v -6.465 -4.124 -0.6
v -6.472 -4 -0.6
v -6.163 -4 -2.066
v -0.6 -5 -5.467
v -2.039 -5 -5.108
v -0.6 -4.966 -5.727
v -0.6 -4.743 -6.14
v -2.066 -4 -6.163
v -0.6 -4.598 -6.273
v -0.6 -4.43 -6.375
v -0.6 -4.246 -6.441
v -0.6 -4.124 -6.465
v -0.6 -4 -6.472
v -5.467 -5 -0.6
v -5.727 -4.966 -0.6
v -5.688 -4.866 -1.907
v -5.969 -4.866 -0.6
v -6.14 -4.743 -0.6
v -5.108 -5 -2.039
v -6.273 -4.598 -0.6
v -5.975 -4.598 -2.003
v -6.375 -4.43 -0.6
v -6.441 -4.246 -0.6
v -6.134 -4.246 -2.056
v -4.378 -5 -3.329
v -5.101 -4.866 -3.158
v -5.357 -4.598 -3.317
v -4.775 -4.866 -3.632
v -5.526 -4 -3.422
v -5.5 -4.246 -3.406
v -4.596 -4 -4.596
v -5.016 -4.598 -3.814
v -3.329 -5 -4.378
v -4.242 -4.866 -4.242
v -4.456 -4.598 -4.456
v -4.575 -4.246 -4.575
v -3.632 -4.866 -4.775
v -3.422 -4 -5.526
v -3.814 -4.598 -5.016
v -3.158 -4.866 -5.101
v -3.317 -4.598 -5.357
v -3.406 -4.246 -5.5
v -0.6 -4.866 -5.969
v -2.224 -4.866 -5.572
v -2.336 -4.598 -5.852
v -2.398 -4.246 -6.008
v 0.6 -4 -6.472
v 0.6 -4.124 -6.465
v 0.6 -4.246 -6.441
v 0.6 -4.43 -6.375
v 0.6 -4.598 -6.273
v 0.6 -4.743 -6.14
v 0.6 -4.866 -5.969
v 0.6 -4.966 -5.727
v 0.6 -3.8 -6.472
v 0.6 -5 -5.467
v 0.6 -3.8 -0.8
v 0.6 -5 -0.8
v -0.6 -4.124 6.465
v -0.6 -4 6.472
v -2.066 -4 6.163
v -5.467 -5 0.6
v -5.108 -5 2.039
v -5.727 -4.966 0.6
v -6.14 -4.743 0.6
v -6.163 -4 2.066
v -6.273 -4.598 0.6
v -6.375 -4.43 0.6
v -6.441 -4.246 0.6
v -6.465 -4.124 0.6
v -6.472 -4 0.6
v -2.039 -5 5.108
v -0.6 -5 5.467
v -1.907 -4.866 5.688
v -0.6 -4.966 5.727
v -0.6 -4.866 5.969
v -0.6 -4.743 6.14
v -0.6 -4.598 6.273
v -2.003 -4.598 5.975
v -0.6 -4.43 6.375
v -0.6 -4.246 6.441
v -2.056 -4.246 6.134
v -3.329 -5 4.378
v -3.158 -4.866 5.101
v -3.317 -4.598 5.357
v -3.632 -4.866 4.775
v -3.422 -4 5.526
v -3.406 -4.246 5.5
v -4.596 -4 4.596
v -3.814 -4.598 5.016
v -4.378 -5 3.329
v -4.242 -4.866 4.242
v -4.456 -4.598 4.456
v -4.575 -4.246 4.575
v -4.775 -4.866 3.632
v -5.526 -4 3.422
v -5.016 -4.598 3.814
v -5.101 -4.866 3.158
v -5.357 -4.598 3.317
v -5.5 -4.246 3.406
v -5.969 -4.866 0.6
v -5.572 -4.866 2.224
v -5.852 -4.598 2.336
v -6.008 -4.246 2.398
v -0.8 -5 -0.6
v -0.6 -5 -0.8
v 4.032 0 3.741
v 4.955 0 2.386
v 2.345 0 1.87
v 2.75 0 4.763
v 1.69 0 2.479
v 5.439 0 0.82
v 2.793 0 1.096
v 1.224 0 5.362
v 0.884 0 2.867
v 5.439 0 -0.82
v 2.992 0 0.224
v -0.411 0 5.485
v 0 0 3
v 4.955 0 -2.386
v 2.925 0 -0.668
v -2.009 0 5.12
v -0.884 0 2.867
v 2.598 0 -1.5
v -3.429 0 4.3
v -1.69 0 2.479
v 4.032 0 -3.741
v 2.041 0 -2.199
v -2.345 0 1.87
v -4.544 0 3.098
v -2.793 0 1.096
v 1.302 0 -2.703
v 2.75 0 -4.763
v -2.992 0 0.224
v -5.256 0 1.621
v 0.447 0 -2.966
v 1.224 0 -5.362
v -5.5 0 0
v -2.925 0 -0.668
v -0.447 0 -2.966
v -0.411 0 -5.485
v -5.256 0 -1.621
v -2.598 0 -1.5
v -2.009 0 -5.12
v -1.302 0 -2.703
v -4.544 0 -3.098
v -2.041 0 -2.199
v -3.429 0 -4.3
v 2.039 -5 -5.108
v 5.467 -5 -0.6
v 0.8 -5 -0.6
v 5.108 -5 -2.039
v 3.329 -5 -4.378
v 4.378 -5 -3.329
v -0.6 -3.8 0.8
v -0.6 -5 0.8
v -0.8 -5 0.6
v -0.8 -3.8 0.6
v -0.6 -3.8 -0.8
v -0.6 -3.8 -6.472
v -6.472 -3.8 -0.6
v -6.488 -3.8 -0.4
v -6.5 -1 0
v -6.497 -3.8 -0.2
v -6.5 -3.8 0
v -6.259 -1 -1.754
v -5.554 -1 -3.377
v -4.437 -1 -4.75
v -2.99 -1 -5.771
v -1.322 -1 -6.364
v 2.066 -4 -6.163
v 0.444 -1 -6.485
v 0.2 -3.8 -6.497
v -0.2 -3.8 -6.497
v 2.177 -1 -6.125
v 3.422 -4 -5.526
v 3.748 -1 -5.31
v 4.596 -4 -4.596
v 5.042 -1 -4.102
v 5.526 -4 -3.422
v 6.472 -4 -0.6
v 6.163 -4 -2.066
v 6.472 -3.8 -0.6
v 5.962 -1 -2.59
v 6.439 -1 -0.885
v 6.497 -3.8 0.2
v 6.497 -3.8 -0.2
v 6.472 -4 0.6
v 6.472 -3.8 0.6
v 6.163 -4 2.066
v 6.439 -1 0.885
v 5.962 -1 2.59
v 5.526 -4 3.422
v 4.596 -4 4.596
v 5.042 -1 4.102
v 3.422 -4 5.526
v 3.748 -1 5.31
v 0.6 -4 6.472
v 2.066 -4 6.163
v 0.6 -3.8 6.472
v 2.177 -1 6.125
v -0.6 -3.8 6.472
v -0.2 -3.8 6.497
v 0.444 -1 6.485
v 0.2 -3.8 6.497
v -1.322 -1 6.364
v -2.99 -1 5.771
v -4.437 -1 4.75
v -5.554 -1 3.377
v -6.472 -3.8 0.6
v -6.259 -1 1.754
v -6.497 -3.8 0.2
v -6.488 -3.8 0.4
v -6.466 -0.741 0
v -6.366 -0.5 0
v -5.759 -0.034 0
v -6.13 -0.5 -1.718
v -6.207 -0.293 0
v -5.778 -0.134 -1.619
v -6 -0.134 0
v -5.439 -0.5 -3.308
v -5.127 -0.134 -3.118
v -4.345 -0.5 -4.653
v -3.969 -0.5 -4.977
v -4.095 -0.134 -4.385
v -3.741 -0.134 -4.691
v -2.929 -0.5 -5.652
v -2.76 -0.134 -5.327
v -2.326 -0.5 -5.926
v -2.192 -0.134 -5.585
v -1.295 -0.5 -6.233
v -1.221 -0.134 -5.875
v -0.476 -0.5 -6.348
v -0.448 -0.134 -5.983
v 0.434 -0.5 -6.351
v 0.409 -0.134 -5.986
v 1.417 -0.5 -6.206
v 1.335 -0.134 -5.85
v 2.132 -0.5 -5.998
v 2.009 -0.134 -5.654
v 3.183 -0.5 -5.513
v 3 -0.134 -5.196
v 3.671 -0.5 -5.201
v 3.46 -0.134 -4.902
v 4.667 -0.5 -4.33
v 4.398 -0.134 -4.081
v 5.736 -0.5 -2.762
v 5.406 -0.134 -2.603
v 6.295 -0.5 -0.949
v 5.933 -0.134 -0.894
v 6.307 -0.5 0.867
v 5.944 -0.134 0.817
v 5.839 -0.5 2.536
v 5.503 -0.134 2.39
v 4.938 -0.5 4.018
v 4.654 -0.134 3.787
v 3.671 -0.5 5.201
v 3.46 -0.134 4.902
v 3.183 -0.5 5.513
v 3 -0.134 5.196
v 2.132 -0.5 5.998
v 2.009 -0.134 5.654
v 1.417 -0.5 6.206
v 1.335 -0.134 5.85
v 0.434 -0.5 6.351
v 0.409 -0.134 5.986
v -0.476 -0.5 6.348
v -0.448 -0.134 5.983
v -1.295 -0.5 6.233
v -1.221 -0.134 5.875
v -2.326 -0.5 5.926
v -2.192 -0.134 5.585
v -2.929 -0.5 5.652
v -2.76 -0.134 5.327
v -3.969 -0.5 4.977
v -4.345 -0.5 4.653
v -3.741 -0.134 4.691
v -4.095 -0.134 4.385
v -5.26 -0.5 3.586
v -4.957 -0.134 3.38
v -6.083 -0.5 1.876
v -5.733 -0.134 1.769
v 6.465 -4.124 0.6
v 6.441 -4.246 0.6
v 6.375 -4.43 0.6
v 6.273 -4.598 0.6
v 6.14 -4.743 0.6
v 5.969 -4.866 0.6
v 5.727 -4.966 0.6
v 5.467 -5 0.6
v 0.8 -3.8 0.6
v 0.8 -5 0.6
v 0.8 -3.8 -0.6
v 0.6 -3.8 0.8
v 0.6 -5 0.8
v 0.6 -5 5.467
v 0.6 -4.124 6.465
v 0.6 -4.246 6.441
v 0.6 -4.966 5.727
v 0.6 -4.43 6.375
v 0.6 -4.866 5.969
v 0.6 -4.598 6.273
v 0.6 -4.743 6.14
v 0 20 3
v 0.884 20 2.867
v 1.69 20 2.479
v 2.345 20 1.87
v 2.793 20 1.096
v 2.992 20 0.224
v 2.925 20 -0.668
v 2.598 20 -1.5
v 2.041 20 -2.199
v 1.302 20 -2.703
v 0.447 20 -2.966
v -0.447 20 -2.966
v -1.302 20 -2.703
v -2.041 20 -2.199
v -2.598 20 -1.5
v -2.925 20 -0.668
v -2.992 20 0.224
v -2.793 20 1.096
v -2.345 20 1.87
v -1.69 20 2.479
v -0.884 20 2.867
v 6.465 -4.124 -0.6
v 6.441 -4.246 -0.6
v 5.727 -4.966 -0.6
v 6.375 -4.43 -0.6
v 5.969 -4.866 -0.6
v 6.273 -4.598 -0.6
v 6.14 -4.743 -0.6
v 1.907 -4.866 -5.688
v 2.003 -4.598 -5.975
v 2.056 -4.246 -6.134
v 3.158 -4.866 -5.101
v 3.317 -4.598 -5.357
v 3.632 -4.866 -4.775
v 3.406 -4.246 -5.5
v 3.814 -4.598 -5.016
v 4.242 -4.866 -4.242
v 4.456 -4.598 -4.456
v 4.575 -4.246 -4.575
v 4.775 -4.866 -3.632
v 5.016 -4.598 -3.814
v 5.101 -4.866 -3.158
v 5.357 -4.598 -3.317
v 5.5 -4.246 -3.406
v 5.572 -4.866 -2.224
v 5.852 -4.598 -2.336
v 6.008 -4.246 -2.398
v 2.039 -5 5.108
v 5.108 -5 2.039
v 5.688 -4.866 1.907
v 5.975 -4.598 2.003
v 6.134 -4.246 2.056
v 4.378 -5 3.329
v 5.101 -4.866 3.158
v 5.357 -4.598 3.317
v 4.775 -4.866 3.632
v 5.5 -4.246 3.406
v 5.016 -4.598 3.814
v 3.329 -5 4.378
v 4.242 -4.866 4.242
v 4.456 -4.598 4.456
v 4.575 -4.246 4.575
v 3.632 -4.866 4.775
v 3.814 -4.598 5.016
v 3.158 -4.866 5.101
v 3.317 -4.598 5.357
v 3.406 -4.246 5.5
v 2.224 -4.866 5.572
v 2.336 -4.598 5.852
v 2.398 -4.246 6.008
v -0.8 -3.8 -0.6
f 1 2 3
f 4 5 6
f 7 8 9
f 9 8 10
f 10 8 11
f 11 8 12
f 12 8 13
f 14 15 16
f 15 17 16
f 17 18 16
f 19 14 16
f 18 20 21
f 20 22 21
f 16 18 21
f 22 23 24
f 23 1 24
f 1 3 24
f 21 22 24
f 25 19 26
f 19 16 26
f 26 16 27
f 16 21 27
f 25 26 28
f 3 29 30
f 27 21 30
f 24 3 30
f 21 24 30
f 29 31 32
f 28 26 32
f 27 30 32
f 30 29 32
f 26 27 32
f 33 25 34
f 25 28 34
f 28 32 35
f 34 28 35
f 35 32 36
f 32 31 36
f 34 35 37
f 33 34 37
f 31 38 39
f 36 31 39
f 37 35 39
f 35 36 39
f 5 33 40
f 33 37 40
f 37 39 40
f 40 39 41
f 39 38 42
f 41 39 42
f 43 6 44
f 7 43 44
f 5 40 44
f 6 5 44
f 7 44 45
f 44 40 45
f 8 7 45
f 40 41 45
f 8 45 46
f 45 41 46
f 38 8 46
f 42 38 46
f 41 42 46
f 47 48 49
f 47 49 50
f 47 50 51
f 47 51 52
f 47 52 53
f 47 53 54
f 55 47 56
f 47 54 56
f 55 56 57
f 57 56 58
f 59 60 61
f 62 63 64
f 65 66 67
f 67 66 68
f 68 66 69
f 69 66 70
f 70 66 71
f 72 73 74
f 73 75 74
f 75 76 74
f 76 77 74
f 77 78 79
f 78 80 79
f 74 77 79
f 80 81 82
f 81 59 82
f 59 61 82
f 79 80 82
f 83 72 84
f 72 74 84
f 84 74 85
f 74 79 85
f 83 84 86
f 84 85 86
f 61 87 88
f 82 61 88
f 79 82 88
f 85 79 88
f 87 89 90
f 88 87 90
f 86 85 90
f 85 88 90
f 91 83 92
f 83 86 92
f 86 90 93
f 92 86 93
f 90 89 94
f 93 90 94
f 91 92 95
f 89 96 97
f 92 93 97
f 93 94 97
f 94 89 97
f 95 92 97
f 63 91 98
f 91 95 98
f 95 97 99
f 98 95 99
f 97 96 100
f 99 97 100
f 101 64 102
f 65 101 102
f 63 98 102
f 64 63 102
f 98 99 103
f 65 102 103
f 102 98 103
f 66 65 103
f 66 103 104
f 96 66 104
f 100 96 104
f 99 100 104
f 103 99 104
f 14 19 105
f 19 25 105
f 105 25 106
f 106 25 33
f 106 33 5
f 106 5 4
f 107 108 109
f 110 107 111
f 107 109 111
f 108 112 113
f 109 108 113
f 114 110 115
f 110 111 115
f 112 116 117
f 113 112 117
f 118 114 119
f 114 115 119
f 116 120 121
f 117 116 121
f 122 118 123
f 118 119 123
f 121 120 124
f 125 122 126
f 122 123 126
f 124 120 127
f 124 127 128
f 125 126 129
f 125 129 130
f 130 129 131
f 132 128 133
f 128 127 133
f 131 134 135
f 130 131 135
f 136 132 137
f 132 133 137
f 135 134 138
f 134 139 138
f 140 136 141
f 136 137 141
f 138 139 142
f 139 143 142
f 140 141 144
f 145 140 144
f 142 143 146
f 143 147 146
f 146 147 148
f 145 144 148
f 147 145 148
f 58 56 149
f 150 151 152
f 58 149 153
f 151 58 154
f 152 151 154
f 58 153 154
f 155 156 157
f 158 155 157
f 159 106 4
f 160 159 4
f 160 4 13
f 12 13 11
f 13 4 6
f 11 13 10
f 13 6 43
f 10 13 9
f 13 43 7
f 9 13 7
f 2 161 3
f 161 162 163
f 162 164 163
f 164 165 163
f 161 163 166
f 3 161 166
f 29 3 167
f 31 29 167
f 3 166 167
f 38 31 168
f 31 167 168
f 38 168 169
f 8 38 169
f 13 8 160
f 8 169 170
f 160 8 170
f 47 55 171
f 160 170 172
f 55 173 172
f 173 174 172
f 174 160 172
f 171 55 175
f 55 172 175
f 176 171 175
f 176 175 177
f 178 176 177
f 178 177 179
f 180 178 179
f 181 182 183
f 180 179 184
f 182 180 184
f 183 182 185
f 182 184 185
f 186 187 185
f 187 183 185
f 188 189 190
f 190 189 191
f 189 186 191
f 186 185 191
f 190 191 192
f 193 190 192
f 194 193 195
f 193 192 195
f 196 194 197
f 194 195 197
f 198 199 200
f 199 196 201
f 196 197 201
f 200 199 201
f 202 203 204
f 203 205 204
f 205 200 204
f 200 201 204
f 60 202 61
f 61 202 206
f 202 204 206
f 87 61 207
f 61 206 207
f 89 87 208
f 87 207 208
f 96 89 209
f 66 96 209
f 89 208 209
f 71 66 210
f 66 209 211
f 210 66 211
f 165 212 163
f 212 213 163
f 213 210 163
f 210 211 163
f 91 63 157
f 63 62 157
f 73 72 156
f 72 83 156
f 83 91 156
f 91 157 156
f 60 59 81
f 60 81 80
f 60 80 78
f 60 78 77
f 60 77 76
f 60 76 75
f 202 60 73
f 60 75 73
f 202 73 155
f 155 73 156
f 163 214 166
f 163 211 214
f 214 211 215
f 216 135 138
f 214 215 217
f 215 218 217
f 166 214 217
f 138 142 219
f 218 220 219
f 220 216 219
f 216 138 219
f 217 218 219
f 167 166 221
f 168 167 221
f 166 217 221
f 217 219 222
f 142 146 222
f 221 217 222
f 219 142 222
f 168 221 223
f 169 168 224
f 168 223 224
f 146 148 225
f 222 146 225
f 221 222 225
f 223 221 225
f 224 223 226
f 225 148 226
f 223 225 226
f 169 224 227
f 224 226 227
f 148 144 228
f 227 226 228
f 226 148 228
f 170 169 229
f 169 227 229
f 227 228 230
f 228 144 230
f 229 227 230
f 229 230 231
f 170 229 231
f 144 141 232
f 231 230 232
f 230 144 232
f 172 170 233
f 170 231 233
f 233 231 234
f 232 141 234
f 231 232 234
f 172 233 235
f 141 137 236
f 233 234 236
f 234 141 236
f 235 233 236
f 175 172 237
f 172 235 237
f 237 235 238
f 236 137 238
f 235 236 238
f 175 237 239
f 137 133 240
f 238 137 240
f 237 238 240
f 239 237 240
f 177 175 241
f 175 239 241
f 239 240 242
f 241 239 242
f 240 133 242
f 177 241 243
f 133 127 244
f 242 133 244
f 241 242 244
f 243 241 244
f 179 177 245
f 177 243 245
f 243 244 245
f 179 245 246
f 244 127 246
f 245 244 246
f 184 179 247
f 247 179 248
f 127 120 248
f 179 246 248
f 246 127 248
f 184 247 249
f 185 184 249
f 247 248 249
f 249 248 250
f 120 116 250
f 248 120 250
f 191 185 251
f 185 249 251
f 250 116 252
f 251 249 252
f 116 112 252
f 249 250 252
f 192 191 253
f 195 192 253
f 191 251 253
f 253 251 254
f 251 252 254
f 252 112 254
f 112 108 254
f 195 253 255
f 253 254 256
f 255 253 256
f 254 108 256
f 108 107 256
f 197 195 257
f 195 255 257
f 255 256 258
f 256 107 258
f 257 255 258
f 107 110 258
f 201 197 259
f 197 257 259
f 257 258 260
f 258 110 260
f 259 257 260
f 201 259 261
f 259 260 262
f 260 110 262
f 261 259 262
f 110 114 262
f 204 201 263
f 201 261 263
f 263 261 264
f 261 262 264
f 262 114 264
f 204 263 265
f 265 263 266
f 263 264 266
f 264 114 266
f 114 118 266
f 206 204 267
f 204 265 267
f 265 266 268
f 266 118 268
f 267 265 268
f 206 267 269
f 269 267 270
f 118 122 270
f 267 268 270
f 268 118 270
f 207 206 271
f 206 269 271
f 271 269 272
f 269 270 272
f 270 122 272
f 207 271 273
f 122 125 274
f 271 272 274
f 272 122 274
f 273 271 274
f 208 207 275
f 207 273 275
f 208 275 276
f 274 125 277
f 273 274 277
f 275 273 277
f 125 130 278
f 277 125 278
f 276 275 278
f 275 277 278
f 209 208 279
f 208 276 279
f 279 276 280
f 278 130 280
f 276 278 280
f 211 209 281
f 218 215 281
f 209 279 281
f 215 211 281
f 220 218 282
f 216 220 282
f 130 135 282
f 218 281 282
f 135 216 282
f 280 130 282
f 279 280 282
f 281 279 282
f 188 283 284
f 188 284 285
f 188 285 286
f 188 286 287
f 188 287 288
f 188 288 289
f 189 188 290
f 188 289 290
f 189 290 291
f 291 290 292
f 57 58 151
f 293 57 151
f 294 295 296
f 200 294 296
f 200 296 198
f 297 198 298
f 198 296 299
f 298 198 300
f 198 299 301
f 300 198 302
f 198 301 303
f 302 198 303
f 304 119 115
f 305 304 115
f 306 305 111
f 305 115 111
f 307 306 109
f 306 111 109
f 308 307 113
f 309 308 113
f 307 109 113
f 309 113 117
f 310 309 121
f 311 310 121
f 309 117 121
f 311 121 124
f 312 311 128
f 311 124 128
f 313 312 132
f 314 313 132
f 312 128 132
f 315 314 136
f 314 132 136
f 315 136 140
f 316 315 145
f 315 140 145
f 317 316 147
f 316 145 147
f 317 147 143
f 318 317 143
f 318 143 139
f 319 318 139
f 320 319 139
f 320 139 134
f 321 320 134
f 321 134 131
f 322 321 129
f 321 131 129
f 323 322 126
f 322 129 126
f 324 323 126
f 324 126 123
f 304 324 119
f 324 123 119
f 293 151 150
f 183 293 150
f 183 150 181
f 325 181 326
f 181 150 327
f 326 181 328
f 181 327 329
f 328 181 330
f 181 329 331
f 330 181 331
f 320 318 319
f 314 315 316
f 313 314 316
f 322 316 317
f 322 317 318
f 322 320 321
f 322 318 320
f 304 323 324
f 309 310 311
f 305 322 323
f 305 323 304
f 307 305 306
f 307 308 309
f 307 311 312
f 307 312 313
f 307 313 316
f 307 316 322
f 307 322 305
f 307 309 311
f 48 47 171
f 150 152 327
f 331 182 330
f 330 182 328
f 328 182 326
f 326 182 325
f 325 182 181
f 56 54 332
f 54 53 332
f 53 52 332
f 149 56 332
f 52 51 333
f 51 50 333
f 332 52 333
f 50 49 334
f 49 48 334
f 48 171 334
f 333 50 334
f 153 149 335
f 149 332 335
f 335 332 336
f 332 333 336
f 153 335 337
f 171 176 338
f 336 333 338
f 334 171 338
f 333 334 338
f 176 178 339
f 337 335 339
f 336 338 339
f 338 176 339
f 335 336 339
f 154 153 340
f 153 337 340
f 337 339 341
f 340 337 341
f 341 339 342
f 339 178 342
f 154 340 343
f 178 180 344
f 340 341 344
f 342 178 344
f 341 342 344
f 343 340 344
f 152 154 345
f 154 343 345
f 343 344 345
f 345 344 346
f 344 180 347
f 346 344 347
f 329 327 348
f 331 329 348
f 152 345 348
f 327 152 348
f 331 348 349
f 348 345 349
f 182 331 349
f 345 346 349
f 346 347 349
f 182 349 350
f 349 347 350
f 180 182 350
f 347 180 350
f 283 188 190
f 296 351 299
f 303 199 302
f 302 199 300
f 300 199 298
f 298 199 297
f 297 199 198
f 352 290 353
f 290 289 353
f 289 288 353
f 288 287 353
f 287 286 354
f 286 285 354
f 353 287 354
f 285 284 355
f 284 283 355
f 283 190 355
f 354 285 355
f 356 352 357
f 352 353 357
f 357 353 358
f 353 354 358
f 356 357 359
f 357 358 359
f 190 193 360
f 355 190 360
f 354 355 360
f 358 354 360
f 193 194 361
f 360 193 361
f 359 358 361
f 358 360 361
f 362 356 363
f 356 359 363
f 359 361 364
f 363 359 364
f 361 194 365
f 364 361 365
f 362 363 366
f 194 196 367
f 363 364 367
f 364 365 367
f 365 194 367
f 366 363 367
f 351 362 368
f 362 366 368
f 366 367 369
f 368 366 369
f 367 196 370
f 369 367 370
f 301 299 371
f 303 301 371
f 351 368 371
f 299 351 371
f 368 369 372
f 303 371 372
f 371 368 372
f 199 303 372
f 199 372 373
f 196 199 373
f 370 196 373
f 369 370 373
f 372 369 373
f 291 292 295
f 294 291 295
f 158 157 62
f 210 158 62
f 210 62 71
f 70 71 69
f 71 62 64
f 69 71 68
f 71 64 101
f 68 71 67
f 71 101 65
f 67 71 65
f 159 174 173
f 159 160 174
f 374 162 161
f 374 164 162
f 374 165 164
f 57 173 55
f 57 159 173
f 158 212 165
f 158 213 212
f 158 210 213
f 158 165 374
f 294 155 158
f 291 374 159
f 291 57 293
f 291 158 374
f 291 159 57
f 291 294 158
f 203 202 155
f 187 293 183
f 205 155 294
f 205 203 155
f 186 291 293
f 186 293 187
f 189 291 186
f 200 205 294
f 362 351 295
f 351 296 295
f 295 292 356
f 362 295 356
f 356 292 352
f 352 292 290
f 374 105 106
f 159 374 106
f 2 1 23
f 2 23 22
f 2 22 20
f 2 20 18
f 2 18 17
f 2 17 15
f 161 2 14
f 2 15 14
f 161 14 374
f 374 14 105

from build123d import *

# Parameters (mm, degrees)
SKETCH1_R           = 3
BOSS_EXTRUDE1_DEPTH = 20
CUT_EXTRUDE1_DEPTH  = 1.2


with BuildPart() as part:
    # Sketch1 → Boss-Extrude1 (new body)
    with BuildSketch(Plane(origin=(0, 0, 0), x_dir=(1, 0, 0), z_dir=(0, 1, 0))):
        with Locations(Location((0, 0, 0), (0, 0, 270))):
            Circle(SKETCH1_R)
    extrude(amount=BOSS_EXTRUDE1_DEPTH)

    # Sketch2 → Revolve1 (revolve)
    with BuildSketch(Plane.XY):
        with BuildLine():
            Line((0, 0), (0, -5))
            Line((0, -5), (-5.5, -5))
            ThreePointArc((-5.5, -5), (-6.207106781, -4.707106781), (-6.5, -4))
            Line((-6.5, -4), (-6.5, -1))
            ThreePointArc((-6.5, -1), (-6.207106781, -0.292893219), (-5.5, 0))
            Line((-5.5, 0), (0, 0))
        make_face()
    revolve(axis=Axis((0, 0, 0), (0, -1, 0)))

    # Sketch3 → Cut-Extrude1 (cut)
    with BuildSketch(Plane.XZ.offset(5)):
        Polygon((0.6, 8.375375313), (-0.6, 8.375375313), (-0.6, 0.8), (-0.8, 0.6), (-7.394108803, 0.6), (-7.394108803, -0.6), (-0.8, -0.6), (-0.6, -0.8), (-0.6, -7.930485814), (0.6, -7.930485814), (0.6, -0.8), (0.8, -0.6), (8.840235389, -0.6), (8.840235389, 0.6), (0.8, 0.6), (0.6, 0.8), align=None)
    extrude(amount=-CUT_EXTRUDE1_DEPTH, mode=Mode.SUBTRACT)


solid = part.part
